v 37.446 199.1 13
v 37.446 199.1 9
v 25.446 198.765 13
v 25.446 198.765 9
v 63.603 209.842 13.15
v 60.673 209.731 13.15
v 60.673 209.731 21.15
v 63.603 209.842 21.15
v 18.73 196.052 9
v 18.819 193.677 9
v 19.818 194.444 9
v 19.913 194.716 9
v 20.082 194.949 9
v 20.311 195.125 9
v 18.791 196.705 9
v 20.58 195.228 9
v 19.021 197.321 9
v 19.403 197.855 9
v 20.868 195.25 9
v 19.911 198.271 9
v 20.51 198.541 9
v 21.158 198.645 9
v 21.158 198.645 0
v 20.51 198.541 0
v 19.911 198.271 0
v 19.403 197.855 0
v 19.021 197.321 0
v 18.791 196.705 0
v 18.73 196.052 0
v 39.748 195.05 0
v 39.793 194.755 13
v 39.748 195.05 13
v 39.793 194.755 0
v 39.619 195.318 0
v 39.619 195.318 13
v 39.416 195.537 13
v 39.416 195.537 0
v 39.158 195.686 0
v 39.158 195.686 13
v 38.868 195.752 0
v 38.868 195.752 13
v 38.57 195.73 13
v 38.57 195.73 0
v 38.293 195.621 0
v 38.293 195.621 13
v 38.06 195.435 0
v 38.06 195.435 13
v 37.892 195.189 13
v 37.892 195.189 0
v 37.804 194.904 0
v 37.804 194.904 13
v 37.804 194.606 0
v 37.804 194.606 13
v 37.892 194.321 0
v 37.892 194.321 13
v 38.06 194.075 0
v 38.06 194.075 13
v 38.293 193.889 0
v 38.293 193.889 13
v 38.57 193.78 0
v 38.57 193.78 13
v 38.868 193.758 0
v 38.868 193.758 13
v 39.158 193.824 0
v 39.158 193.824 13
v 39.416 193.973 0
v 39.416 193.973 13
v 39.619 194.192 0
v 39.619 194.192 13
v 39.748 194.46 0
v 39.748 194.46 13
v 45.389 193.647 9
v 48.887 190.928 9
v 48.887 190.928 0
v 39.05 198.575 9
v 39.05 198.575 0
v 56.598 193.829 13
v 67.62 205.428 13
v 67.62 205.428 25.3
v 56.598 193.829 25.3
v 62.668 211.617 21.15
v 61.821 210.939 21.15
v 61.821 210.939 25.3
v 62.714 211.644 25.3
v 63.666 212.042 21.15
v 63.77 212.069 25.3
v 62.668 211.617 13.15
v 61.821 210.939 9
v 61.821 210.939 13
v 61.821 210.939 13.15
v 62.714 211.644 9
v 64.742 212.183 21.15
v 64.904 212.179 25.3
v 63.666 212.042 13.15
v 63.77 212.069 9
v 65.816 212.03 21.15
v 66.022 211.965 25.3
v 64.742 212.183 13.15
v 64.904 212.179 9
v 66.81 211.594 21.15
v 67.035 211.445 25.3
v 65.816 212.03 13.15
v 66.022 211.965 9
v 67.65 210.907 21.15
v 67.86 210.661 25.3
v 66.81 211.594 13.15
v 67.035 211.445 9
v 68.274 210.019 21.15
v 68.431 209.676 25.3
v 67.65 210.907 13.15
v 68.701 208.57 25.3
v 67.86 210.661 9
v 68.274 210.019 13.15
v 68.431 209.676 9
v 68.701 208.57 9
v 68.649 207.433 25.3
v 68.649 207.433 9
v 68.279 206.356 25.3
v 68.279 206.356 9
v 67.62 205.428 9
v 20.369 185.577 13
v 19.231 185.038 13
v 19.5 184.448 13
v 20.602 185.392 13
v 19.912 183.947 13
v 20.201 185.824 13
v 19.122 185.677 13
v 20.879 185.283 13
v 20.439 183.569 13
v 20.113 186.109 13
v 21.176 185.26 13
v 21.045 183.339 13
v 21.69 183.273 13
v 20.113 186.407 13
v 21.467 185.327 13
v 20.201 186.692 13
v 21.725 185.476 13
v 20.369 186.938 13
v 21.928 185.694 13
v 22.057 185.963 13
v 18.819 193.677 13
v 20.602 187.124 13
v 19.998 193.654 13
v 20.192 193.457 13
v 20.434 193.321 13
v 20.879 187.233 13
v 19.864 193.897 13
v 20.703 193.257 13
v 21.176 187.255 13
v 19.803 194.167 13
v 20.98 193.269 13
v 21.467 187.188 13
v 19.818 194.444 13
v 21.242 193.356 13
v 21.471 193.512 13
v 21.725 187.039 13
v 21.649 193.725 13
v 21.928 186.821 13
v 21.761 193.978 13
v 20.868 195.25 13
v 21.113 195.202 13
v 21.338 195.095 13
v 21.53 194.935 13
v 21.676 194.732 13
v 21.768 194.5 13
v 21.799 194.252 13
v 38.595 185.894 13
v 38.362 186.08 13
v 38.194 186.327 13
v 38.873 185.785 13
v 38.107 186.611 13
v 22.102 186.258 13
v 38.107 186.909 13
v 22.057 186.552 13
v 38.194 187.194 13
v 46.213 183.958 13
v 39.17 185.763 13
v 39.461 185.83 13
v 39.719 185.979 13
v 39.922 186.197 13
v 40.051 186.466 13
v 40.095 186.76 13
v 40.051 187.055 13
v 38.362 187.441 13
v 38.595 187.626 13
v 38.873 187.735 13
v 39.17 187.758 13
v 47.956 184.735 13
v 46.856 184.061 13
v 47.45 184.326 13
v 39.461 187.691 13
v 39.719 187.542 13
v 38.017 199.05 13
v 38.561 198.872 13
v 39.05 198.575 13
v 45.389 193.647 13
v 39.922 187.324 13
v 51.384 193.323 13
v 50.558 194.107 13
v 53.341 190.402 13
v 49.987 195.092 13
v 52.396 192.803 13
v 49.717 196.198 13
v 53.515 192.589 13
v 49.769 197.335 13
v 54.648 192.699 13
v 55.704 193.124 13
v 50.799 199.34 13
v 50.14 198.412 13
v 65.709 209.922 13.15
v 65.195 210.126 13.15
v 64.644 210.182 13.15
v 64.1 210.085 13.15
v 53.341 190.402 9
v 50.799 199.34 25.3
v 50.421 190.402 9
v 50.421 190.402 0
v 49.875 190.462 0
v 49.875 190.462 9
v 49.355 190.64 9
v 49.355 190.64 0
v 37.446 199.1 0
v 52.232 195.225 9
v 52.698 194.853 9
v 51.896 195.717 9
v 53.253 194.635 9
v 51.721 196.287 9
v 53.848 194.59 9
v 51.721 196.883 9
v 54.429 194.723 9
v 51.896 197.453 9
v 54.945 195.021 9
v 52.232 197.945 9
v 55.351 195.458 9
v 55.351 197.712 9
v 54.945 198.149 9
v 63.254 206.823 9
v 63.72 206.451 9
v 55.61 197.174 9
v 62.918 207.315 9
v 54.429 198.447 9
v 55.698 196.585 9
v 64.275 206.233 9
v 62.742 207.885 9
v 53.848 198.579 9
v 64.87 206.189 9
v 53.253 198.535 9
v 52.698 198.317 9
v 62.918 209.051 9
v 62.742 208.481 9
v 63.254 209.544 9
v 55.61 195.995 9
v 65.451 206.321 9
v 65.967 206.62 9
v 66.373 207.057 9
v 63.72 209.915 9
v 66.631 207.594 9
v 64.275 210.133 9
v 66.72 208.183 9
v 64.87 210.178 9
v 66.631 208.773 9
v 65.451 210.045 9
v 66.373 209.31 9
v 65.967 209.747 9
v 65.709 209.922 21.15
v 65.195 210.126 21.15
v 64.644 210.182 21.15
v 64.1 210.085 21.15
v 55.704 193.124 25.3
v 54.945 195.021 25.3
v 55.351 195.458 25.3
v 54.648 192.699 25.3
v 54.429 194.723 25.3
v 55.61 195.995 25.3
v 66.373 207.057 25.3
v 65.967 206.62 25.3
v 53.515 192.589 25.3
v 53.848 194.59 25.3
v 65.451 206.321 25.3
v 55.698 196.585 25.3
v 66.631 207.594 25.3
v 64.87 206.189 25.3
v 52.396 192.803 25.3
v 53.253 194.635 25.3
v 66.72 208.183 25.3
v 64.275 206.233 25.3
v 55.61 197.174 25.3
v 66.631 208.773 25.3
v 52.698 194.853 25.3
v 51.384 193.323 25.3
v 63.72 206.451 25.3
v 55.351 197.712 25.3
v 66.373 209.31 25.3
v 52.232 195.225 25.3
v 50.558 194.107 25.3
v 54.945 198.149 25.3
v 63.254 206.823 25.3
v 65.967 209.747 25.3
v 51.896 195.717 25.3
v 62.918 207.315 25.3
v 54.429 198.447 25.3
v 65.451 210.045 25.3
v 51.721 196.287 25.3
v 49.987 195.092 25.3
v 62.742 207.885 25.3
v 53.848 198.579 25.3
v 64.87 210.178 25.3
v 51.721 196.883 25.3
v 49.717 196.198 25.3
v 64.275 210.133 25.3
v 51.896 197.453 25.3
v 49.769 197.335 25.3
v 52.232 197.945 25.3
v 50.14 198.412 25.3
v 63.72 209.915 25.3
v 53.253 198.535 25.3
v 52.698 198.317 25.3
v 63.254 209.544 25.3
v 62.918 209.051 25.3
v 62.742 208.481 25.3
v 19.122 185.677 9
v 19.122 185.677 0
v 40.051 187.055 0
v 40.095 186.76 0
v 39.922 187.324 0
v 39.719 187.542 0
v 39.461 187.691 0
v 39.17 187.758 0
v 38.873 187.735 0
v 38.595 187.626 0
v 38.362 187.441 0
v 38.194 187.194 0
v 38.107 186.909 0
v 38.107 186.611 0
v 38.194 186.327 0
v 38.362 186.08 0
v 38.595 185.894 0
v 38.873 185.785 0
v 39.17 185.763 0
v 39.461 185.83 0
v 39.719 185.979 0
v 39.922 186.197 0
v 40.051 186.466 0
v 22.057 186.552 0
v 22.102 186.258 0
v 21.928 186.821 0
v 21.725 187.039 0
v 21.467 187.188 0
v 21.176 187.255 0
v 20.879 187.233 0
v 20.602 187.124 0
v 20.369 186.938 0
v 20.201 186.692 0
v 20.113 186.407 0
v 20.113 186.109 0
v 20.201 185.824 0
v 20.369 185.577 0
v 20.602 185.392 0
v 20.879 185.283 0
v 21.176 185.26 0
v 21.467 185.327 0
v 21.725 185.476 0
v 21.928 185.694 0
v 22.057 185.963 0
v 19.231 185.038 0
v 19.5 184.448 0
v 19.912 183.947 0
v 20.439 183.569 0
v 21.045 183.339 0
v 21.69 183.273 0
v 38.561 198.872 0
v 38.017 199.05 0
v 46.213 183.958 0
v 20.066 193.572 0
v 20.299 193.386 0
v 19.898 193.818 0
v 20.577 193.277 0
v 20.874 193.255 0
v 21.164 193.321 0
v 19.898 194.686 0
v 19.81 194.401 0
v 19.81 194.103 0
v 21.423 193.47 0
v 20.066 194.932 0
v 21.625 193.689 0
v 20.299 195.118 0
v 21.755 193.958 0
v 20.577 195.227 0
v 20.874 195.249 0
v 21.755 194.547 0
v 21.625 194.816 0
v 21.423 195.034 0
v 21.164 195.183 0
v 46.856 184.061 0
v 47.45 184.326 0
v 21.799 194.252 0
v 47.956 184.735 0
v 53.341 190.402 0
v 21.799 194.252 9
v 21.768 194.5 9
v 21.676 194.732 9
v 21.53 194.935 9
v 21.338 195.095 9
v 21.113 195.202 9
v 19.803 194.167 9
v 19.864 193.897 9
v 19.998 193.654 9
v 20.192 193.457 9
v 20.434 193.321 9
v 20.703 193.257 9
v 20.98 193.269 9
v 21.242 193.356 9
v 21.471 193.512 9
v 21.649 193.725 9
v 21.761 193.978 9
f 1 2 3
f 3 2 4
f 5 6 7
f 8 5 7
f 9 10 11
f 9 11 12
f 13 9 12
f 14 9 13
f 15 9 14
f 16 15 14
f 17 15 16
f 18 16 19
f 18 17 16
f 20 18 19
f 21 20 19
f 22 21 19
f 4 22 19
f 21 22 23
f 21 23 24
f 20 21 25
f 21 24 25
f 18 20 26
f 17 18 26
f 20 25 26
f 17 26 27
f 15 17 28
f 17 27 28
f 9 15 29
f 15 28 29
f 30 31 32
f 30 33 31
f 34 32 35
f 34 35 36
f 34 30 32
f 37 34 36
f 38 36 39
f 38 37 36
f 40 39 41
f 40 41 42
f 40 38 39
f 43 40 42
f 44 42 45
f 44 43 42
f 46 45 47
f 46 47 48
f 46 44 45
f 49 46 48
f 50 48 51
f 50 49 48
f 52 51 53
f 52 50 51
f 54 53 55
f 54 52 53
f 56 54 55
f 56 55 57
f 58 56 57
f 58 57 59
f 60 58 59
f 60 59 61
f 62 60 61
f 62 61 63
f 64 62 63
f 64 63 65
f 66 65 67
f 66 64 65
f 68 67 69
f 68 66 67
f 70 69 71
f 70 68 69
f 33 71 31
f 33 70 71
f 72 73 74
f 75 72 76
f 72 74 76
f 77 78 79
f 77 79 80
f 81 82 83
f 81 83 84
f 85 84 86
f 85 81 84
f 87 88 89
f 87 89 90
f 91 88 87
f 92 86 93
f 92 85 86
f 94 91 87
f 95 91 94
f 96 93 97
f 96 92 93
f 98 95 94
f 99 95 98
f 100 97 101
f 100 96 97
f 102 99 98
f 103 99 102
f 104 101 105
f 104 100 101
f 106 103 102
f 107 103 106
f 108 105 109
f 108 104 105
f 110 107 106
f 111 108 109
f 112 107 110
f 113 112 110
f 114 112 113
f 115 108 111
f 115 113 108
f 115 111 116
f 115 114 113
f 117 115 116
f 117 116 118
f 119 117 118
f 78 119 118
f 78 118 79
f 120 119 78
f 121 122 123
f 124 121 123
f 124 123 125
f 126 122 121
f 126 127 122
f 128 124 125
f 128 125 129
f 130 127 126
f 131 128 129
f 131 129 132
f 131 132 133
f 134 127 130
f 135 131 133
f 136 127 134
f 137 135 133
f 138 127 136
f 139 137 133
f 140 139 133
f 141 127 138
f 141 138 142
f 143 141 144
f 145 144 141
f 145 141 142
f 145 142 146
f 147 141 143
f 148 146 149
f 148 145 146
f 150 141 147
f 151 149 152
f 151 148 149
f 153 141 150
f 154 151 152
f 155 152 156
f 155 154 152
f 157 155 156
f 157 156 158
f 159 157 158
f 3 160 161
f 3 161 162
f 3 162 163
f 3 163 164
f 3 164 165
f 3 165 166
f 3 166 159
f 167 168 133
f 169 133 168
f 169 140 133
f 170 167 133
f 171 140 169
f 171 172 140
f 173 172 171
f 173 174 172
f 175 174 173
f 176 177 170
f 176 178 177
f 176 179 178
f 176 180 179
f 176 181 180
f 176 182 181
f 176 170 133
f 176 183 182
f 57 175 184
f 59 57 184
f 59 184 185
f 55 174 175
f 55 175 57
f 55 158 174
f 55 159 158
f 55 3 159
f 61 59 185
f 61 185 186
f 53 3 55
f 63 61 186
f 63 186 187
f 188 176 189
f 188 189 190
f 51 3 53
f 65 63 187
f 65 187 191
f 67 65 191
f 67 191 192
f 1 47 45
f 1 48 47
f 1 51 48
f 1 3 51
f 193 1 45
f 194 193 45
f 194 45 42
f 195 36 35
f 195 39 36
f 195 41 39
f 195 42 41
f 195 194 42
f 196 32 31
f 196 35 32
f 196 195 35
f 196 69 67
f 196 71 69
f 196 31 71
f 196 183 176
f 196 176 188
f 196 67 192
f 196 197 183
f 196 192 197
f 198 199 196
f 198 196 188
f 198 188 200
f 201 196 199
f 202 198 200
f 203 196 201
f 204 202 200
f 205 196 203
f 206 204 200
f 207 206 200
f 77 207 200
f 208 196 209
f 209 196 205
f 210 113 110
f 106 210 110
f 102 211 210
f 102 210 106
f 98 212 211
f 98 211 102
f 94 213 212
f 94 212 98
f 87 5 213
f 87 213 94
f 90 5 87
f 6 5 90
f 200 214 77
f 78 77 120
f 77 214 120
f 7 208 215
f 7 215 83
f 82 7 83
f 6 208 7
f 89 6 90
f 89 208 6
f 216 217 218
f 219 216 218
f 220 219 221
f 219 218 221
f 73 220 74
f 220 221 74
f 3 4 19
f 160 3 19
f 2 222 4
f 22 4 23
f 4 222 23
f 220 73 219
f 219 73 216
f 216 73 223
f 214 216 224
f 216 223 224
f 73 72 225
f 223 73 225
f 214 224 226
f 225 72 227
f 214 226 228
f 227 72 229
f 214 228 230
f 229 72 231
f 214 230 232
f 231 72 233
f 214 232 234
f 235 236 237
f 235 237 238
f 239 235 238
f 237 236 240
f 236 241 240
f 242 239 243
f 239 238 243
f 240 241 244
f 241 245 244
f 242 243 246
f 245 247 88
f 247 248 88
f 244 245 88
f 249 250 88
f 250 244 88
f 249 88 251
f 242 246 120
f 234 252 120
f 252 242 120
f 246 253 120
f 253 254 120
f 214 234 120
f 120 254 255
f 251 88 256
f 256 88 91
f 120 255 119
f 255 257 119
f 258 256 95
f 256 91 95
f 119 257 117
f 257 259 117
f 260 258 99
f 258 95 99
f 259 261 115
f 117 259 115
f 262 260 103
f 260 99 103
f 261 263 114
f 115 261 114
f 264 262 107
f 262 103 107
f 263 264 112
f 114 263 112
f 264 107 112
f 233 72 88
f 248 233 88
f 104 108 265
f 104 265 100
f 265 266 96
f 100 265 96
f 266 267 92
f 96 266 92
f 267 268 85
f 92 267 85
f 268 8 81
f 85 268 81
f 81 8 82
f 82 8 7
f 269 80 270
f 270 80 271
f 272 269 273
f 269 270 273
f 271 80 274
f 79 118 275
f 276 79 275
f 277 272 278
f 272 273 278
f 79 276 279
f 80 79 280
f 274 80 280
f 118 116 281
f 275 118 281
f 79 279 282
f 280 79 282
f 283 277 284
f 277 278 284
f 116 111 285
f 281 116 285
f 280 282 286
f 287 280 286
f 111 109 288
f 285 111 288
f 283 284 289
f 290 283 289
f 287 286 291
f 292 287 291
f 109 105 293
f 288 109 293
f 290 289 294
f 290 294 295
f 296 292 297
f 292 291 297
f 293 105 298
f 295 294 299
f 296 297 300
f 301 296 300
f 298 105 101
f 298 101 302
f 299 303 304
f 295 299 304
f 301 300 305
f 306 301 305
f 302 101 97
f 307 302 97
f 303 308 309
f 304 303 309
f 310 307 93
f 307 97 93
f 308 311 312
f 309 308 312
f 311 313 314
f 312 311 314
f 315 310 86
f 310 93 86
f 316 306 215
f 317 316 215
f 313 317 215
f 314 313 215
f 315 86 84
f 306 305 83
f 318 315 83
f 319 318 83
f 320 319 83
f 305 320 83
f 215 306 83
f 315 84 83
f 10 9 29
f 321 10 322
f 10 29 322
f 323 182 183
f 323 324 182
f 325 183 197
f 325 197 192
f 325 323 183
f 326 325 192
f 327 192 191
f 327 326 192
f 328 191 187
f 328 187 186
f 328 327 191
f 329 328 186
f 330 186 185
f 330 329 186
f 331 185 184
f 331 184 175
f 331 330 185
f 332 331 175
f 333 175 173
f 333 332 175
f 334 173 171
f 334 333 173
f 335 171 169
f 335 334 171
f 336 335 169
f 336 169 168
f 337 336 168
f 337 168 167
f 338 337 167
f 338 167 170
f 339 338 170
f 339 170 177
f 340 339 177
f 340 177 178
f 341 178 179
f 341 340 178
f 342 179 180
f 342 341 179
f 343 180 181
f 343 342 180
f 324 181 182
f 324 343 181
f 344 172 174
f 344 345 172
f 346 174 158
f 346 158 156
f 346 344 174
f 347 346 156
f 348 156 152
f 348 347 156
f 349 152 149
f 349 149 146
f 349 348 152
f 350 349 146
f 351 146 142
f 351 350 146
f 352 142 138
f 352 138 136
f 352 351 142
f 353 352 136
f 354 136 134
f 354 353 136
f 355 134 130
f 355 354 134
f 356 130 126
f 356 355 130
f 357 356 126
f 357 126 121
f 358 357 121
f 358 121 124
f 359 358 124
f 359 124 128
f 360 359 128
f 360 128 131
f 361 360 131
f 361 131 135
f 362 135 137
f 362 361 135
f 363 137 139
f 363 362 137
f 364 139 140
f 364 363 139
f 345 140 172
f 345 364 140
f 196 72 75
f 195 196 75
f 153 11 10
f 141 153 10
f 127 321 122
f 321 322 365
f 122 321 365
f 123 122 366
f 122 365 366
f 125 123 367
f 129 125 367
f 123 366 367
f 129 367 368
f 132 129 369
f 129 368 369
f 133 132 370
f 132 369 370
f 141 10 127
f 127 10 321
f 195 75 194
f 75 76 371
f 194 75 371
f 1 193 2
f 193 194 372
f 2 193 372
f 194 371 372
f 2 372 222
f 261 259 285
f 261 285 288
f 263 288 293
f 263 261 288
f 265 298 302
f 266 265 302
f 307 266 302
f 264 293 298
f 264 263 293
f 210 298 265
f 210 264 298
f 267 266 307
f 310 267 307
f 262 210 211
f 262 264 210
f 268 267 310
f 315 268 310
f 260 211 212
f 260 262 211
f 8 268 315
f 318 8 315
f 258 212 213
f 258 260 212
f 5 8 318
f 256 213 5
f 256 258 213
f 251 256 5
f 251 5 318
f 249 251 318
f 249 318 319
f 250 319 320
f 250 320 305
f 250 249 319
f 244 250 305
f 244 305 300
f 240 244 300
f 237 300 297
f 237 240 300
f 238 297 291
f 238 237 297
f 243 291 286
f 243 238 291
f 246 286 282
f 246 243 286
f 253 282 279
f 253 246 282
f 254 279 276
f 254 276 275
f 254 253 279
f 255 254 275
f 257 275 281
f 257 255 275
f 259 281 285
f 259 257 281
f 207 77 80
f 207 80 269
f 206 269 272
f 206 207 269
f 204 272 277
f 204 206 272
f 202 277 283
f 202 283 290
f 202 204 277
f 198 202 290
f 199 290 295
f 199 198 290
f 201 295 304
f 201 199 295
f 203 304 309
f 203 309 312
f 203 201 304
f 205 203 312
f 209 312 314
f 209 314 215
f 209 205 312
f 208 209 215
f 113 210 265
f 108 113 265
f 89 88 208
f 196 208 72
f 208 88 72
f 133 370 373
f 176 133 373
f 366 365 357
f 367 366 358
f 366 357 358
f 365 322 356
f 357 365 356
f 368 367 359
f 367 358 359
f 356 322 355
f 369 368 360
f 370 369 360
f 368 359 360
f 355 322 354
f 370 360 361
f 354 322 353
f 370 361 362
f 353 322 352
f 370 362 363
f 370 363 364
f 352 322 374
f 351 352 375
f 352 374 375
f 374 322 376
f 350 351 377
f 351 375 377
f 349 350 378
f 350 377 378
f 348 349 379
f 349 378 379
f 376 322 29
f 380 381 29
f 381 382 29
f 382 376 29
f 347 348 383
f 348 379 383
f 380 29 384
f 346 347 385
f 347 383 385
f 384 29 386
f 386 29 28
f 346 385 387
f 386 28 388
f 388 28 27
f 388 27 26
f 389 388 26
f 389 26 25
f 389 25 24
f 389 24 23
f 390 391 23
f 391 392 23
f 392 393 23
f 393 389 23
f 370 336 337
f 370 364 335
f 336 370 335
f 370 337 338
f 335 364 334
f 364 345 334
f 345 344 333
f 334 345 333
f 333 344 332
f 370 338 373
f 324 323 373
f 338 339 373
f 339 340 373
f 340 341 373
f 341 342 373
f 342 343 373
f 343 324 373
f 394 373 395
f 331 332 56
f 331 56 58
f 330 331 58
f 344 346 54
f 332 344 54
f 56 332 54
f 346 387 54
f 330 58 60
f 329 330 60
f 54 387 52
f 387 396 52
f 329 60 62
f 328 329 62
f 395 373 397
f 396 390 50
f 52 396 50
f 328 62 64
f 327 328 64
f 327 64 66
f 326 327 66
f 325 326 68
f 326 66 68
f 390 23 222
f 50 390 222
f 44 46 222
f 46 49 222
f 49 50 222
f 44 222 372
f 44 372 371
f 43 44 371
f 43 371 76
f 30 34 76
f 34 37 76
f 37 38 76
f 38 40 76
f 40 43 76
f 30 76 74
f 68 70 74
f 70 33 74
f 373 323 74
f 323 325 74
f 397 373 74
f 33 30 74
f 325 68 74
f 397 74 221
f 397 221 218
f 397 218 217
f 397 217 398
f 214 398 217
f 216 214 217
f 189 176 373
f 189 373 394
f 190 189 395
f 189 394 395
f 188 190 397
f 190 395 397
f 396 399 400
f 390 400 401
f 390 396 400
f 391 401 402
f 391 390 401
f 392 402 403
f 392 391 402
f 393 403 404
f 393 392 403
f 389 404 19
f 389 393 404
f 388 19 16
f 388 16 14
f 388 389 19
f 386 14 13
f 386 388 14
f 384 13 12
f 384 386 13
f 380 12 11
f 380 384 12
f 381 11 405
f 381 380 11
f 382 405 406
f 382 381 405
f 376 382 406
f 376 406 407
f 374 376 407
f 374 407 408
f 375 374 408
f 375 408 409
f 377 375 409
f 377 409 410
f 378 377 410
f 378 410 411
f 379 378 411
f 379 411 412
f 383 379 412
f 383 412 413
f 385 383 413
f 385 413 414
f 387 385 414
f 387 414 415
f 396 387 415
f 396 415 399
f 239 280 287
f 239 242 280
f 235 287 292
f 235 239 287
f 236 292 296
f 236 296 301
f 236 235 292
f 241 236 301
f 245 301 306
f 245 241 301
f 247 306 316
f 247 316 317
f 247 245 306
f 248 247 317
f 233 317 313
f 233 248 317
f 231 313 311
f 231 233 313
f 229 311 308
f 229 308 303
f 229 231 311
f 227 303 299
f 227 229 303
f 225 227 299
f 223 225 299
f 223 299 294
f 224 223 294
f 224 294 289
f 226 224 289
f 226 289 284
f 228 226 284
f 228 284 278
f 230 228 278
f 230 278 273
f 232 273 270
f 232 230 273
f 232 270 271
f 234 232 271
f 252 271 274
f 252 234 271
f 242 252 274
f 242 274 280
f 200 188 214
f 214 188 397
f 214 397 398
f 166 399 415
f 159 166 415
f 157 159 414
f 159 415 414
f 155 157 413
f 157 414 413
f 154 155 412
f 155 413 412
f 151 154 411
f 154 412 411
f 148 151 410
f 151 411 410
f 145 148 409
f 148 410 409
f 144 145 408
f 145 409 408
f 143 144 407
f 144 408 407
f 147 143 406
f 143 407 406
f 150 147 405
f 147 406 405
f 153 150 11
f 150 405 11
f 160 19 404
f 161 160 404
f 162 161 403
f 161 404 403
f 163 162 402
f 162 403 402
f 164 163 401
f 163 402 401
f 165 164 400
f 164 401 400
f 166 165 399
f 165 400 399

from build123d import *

# Parameters (mm, degrees)
SKETCH1_R           = 1
BOSS_EXTRUDE1_DEPTH = 9
SKETCH2_R           = 2
SKETCH2_R_2         = 1
BOSS_EXTRUDE3_DEPTH = 4
SKETCH3_R           = 2
BOSS_EXTRUDE4_DEPTH = 12.3
SKETCH4_W           = 8
SKETCH4_H           = 2.3
CUT_EXTRUDE1_DEPTH  = 100


with BuildPart() as part:
    # Sketch1 → Boss-Extrude1 (new body)
    with BuildSketch(Plane.XY):
        with BuildLine():
            Line((37.44618629, 199.100176708), (21.157913115, 198.645068222))
            ThreePointArc((21.157913115, 198.645068222), (19.402812913, 197.854741355), (18.729526359, 196.051500247))
            Line((18.729526359, 196.051500247), (19.122128495, 185.677380061))
            ThreePointArc((19.122128495, 185.677380061), (19.911642331, 183.946998209), (21.690165088, 183.272898624))
            Line((21.690165088, 183.272898624), (46.213174666, 183.958092791))
            ThreePointArc((46.213174666, 183.958092791), (47.16140114, 184.173792868), (47.955590742, 184.734972736))
            Line((47.955590742, 184.734972736), (53.340647935, 190.401756173))
            Line((53.340647935, 190.401756173), (50.421306908, 190.401756173))
            ThreePointArc((50.421306908, 190.401756173), (49.61024665, 190.536976848), (48.886924084, 190.928011166))
            Line((48.886924084, 190.928011166), (39.050394032, 198.574897009))
            ThreePointArc((39.050394032, 198.574897009), (38.293965035, 198.977028229), (37.44618629, 199.100176708))
        make_face()
        with Locations((20.799047924, 194.252293006)):
            Circle(SKETCH1_R, mode=Mode.SUBTRACT)
        with Locations((38.792906294, 194.755057023)):
            Circle(SKETCH1_R, mode=Mode.SUBTRACT)
        with Locations((39.095459561, 186.760388464)):
            Circle(SKETCH1_R, mode=Mode.SUBTRACT)
        with Locations((21.101601191, 186.257624448)):
            Circle(SKETCH1_R, mode=Mode.SUBTRACT)
    extrude(amount=BOSS_EXTRUDE1_DEPTH)

    # Sketch2 → Boss-Extrude3 (add)
    with BuildSketch(Plane.XY.offset(9)):
        with BuildLine():
            Line((61.820501213, 210.938669532), (45.388864845, 193.647390819))
            Line((45.388864845, 193.647390819), (48.886924084, 190.928011166))
            ThreePointArc((48.886924084, 190.928011166), (49.61024665, 190.536976848), (50.421306908, 190.401756173))
            Line((50.421306908, 190.401756173), (53.340647935, 190.401756173))
            Line((53.340647935, 190.401756173), (67.619672397, 205.427806299))
            ThreePointArc((67.619672397, 205.427806299), (67.475518422, 211.082823507), (61.820501213, 210.938669532))
        make_face()
        with Locations((53.698360337, 196.584895548)):
            Circle(SKETCH2_R, mode=Mode.SUBTRACT)
        with Locations((64.720086805, 208.183237915)):
            Circle(SKETCH2_R, mode=Mode.SUBTRACT)
        with BuildLine():
            Line((37.44618629, 199.100176708), (25.44618629, 198.764886296))
            Line((25.44618629, 198.764886296), (20.867726047, 195.249931876))
            ThreePointArc((20.867726047, 195.249931876), (21.530032918, 194.934686542), (21.799047924, 194.252293006))
            ThreePointArc((21.799047924, 194.252293006), (20.702907489, 193.256925226), (19.817533891, 194.443683189))
            Line((19.817533891, 194.443683189), (18.819373463, 193.677380061))
            Line((18.819373463, 193.677380061), (19.122128495, 185.677380061))
            ThreePointArc((19.122128495, 185.677380061), (19.911642331, 183.946998209), (21.690165088, 183.272898624))
            Line((21.690165088, 183.272898624), (46.213174666, 183.958092791))
            ThreePointArc((46.213174666, 183.958092791), (47.16140114, 184.173792868), (47.955590742, 184.734972736))
            Line((47.955590742, 184.734972736), (53.340647935, 190.401756173))
            Line((53.340647935, 190.401756173), (50.421306908, 190.401756173))
            ThreePointArc((50.421306908, 190.401756173), (49.61024665, 190.536976848), (48.886924084, 190.928011166))
            Line((48.886924084, 190.928011166), (45.388864845, 193.647390819))
            Line((45.388864845, 193.647390819), (39.050394032, 198.574897009))
            ThreePointArc((39.050394032, 198.574897009), (38.293965035, 198.977028229), (37.44618629, 199.100176708))
        make_face()
        with Locations((21.101601191, 186.257624448)):
            Circle(SKETCH2_R_2, mode=Mode.SUBTRACT)
        with Locations((39.095459561, 186.760388464)):
            Circle(SKETCH2_R_2, mode=Mode.SUBTRACT)
        with Locations((38.792906294, 194.755057023)):
            Circle(SKETCH2_R_2, mode=Mode.SUBTRACT)
    extrude(amount=BOSS_EXTRUDE3_DEPTH)

    # Sketch3 → Boss-Extrude4 (add)
    with BuildSketch(Plane.XY.offset(13)):
        with BuildLine():
            Line((67.619672397, 205.427806299), (56.597945929, 193.829463931))
            ThreePointArc((56.597945929, 193.829463931), (50.94292872, 193.685309956), (50.798774745, 199.340327165))
            Line((50.798774745, 199.340327165), (61.820501213, 210.938669532))
            ThreePointArc((61.820501213, 210.938669532), (67.475518422, 211.082823507), (67.619672397, 205.427806299))
        make_face()
        with Locations((64.720086805, 208.183237915)):
            Circle(SKETCH3_R, mode=Mode.SUBTRACT)
        with Locations((53.698360337, 196.584895548)):
            Circle(SKETCH3_R, mode=Mode.SUBTRACT)
    extrude(amount=BOSS_EXTRUDE4_DEPTH)

    # Sketch4 → Cut-Extrude1 (cut)
    with BuildSketch(Plane(origin=(26.111576718, 0.988176406, 0), x_dir=(0, 0, 1), z_dir=(-0.99928467, -0.037817308, 0))):
        with Locations((17.15, 208.436778709)):
            Rectangle(SKETCH4_W, SKETCH4_H)
    extrude(amount=-CUT_EXTRUDE1_DEPTH, mode=Mode.SUBTRACT)


solid = part.part
